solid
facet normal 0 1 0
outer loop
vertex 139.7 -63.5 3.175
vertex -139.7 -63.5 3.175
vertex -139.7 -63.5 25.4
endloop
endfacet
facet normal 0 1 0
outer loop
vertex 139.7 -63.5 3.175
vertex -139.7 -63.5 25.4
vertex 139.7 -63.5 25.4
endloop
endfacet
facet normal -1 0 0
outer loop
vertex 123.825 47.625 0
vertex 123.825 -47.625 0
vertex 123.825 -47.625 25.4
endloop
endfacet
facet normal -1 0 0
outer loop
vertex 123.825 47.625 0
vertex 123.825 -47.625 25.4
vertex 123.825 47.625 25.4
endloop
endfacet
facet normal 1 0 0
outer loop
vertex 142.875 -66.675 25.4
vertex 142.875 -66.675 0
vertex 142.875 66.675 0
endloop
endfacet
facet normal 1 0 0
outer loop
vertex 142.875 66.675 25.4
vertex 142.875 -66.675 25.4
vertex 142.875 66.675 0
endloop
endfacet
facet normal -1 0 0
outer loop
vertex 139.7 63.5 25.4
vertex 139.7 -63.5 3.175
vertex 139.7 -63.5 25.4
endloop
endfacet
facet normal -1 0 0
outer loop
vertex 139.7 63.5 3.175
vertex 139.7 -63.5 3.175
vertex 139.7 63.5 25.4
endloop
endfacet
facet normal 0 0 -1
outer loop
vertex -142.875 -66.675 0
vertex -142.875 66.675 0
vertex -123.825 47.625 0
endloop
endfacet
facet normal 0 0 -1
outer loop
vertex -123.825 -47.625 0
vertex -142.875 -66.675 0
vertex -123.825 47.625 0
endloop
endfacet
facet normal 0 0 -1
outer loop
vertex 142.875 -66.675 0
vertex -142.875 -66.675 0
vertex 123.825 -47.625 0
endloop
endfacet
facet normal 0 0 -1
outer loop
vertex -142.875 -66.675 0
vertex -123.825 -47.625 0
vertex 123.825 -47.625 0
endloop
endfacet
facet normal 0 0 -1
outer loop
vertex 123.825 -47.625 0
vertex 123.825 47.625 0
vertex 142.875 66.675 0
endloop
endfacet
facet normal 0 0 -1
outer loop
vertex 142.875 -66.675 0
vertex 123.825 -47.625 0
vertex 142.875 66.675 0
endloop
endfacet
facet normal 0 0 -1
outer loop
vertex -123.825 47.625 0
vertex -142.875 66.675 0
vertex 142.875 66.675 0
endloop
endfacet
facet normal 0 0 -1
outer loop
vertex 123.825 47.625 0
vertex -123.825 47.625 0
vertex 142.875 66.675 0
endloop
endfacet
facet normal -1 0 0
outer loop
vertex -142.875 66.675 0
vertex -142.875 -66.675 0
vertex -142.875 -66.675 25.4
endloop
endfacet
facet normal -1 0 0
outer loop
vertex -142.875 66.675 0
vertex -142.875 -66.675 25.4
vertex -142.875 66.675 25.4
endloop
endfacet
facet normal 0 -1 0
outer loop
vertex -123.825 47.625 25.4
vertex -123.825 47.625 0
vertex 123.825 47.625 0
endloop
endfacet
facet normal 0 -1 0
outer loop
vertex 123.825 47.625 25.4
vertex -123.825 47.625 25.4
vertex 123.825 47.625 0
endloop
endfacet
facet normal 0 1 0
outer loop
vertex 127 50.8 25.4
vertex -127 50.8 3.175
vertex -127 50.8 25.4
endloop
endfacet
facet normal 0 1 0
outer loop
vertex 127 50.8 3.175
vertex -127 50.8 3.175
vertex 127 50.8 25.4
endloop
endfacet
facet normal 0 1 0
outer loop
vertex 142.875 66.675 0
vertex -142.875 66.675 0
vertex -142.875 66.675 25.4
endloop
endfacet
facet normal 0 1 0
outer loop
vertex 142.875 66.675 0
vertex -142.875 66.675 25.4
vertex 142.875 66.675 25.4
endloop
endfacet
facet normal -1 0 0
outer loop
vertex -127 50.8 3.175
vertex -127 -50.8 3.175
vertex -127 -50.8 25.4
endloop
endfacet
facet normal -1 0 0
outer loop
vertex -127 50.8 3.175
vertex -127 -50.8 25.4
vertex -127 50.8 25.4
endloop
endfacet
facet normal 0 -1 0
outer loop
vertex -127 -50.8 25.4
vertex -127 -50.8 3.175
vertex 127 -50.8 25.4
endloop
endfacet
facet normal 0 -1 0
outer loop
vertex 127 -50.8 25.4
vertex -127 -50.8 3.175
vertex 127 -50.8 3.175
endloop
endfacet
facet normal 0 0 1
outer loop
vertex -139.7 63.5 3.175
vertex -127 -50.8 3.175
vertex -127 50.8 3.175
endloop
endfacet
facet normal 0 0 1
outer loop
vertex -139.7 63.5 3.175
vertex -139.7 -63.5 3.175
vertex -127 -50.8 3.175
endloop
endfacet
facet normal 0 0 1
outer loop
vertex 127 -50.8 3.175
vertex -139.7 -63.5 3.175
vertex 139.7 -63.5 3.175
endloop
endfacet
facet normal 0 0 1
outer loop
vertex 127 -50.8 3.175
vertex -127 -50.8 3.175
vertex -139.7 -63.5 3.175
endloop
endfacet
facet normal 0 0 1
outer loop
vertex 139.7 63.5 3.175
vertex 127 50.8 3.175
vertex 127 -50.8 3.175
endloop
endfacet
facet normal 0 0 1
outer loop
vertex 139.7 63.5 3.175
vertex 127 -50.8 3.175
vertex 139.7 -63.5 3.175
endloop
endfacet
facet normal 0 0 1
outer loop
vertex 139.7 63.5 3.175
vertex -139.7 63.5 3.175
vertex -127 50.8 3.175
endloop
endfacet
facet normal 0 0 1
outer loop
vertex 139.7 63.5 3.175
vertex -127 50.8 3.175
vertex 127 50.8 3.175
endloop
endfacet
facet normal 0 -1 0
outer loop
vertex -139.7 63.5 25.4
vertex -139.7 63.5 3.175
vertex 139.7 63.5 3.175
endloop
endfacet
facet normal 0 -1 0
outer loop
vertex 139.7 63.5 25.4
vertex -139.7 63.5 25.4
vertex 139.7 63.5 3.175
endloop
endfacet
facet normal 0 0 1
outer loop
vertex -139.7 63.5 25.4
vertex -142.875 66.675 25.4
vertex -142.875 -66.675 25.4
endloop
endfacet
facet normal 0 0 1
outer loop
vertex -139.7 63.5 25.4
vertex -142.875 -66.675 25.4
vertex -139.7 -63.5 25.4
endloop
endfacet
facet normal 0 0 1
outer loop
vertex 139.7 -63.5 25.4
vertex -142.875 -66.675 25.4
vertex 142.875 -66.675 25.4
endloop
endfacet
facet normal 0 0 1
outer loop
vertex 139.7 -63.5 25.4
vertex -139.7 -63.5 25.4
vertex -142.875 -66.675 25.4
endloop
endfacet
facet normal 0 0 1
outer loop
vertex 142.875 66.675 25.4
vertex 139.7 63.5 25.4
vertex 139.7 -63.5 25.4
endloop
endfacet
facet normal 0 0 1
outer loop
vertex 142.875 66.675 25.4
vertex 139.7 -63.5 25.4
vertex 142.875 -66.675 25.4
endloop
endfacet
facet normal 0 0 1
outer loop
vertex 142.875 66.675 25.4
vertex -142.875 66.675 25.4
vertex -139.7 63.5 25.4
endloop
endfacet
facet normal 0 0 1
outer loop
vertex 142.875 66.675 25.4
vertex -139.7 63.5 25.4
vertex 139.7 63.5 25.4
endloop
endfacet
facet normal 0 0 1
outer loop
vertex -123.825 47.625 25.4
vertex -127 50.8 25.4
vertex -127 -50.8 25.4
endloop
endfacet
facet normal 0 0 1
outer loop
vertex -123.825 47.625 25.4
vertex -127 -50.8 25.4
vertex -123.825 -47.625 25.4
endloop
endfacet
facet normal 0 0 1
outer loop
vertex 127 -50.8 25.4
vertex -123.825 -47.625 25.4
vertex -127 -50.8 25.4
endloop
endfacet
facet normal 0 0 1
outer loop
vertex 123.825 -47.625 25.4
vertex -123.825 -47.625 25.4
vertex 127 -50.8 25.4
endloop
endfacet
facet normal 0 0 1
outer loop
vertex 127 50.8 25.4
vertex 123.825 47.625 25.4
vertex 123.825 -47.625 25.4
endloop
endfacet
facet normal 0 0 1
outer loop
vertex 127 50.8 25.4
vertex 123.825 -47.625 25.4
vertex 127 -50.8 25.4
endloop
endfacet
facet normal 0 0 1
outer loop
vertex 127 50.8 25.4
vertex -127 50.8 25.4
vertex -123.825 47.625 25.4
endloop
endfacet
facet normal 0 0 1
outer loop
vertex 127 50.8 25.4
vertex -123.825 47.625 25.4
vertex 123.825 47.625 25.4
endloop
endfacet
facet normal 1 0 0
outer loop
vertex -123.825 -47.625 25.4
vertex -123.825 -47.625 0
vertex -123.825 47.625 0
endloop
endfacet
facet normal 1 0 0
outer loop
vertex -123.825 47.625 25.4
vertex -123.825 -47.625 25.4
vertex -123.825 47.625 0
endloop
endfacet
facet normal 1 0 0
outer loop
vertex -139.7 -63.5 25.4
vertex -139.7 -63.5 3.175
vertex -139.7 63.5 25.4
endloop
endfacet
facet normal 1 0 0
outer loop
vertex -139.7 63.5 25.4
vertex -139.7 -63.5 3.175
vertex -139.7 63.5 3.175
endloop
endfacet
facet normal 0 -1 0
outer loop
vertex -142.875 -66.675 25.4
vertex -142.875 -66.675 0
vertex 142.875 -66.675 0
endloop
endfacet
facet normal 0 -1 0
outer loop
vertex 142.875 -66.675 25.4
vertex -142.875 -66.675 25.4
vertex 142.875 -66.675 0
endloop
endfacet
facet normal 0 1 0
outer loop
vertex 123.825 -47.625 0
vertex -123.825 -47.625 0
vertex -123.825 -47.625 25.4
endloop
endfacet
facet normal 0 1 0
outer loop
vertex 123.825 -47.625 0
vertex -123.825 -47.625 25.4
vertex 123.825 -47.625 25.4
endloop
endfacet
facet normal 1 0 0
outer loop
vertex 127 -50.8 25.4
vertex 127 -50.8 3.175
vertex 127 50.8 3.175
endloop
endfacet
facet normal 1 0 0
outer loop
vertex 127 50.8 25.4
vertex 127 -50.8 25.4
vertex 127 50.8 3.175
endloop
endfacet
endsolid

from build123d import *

# Parameters (mm, degrees)
F1_W     = 279.4
F1_H     = 127
F1_W_2   = 254
F1_H_2   = 101.6
F3_DEPTH = 3.175
F2_W     = 285.75
F2_H     = 133.35
F2_W_2   = 279.4
F2_H_2   = 127
F6_DEPTH = 25.4
F7_W     = 254
F7_H     = 101.6
F7_W_2   = 247.65
F7_H_2   = 95.25
F8_DEPTH = 25.4


with BuildPart() as f3:
    # F1 (on Top) → F3 (new body)
    with BuildSketch(Plane.XY):
        Rectangle(F1_W, F1_H)
        Rectangle(F1_W_2, F1_H_2, mode=Mode.SUBTRACT)
    extrude(amount=F3_DEPTH)

    # F2 (on face) → F6 (join)
    with BuildSketch(Plane.XY):
        Rectangle(F2_W, F2_H)
        Rectangle(F2_W_2, F2_H_2, mode=Mode.SUBTRACT)
    extrude(amount=F6_DEPTH)

    # F7 (on face) → F8 (join)
    with BuildSketch(Plane.XY):
        Rectangle(F7_W, F7_H)
        Rectangle(F7_W_2, F7_H_2, mode=Mode.SUBTRACT)
    extrude(amount=F8_DEPTH)


solid = f3.part
